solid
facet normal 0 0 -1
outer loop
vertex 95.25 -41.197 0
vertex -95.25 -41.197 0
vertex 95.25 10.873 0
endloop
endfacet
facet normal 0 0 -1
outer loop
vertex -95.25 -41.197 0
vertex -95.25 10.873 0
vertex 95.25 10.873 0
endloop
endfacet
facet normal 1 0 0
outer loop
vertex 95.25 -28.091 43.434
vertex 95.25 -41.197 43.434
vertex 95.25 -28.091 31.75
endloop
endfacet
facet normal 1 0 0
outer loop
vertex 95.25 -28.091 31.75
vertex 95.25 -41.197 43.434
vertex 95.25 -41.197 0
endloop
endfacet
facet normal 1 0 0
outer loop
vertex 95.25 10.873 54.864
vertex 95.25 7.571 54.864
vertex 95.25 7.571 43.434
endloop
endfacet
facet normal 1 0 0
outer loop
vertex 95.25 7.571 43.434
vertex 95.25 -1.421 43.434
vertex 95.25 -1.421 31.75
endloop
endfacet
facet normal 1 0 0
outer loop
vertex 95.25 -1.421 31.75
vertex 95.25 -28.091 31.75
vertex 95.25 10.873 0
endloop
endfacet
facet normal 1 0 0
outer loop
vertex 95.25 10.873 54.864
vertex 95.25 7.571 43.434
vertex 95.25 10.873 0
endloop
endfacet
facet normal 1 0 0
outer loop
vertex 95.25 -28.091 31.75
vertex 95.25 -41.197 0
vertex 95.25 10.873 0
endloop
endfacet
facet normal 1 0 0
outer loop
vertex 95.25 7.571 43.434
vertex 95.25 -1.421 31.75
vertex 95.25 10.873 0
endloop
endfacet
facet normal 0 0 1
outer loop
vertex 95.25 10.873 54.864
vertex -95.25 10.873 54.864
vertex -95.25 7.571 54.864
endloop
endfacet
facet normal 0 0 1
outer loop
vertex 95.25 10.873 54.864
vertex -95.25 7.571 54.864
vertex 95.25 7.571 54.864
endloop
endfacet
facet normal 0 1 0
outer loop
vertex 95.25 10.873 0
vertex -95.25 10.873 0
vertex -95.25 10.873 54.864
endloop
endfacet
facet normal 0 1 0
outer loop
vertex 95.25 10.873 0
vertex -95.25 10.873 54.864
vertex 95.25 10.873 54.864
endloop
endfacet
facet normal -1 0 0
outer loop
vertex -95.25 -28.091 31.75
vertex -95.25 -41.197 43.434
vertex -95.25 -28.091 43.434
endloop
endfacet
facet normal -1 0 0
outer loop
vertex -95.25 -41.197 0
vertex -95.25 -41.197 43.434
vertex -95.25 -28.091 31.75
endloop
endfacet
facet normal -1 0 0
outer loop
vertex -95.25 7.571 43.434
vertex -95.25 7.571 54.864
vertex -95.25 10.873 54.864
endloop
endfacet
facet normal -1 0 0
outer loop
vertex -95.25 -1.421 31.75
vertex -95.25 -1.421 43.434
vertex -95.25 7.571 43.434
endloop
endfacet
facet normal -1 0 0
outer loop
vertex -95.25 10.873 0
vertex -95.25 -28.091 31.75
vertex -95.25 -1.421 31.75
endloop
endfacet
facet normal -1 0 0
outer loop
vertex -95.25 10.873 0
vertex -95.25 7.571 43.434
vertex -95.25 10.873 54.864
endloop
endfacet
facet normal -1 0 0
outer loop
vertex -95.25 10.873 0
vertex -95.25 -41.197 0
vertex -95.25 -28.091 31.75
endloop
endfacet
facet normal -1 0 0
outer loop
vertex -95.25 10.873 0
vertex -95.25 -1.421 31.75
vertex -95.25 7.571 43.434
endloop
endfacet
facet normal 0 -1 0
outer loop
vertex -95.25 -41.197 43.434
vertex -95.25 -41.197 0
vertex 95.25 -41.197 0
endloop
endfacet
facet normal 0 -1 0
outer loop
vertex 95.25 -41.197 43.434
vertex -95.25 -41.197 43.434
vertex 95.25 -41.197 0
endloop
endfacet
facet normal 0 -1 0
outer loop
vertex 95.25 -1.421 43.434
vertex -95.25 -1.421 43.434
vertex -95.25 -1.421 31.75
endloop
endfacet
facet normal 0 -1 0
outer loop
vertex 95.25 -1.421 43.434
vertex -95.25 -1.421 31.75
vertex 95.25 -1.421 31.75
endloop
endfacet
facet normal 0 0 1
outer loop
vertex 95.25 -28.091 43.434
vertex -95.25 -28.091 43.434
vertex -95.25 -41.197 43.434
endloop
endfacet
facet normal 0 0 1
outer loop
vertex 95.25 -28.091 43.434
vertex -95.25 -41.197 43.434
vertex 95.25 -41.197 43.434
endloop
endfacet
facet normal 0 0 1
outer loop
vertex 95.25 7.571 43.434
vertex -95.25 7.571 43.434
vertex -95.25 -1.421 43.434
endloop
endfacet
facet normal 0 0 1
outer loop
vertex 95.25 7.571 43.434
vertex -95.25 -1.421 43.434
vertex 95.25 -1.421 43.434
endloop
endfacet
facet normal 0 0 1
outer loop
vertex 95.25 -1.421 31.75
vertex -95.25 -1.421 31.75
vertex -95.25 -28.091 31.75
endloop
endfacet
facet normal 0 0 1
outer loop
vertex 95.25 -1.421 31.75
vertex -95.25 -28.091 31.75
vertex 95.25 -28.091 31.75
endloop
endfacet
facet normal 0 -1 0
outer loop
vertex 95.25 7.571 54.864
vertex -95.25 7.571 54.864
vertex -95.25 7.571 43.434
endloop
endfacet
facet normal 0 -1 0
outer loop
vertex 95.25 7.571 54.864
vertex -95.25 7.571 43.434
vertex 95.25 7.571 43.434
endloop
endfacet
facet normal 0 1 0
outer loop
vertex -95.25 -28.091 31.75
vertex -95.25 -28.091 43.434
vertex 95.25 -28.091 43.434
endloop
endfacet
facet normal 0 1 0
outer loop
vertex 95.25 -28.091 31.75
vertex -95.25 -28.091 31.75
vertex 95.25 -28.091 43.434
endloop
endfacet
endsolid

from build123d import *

# Parameters (mm, degrees)
F0_W     = 190.5
F0_H     = 21.746124
F1_DEPTH = 54.864
F3_W     = 190.5
F3_H     = 18.542
F4_DEPTH = 11.43
F6_W     = 190.5
F6_H     = 52.07
F7_DEPTH = 43.434
F8_W     = 190.5
F8_H     = 26.67
F9_DEPTH = 23.114


with BuildPart() as f1:
    # F0 (on Top) → F1 (new body)
    with BuildSketch(Plane.XY):
        Rectangle(F0_W, F0_H)
    extrude(amount=F1_DEPTH)

    # F3 (on face) → F4 (cut)
    with BuildSketch(Plane.XY.offset(54.864)):
        with Locations((0, -1.699938)):
            Rectangle(F3_W, F3_H)
    extrude(amount=-F4_DEPTH, mode=Mode.SUBTRACT)

    # F6 (on Top) → F7 (join)
    with BuildSketch(Plane.XY):
        with Locations((0, -15.161938)):
            Rectangle(F6_W, F6_H)
    extrude(amount=F7_DEPTH)

    # F8 (on face) → F9 (cut)
    with BuildSketch(Plane.XY.offset(54.864)):
        with Locations((0, -14.755538)):
            Rectangle(F8_W, F8_H)
    extrude(amount=-F9_DEPTH, mode=Mode.SUBTRACT)


solid = f1.part
